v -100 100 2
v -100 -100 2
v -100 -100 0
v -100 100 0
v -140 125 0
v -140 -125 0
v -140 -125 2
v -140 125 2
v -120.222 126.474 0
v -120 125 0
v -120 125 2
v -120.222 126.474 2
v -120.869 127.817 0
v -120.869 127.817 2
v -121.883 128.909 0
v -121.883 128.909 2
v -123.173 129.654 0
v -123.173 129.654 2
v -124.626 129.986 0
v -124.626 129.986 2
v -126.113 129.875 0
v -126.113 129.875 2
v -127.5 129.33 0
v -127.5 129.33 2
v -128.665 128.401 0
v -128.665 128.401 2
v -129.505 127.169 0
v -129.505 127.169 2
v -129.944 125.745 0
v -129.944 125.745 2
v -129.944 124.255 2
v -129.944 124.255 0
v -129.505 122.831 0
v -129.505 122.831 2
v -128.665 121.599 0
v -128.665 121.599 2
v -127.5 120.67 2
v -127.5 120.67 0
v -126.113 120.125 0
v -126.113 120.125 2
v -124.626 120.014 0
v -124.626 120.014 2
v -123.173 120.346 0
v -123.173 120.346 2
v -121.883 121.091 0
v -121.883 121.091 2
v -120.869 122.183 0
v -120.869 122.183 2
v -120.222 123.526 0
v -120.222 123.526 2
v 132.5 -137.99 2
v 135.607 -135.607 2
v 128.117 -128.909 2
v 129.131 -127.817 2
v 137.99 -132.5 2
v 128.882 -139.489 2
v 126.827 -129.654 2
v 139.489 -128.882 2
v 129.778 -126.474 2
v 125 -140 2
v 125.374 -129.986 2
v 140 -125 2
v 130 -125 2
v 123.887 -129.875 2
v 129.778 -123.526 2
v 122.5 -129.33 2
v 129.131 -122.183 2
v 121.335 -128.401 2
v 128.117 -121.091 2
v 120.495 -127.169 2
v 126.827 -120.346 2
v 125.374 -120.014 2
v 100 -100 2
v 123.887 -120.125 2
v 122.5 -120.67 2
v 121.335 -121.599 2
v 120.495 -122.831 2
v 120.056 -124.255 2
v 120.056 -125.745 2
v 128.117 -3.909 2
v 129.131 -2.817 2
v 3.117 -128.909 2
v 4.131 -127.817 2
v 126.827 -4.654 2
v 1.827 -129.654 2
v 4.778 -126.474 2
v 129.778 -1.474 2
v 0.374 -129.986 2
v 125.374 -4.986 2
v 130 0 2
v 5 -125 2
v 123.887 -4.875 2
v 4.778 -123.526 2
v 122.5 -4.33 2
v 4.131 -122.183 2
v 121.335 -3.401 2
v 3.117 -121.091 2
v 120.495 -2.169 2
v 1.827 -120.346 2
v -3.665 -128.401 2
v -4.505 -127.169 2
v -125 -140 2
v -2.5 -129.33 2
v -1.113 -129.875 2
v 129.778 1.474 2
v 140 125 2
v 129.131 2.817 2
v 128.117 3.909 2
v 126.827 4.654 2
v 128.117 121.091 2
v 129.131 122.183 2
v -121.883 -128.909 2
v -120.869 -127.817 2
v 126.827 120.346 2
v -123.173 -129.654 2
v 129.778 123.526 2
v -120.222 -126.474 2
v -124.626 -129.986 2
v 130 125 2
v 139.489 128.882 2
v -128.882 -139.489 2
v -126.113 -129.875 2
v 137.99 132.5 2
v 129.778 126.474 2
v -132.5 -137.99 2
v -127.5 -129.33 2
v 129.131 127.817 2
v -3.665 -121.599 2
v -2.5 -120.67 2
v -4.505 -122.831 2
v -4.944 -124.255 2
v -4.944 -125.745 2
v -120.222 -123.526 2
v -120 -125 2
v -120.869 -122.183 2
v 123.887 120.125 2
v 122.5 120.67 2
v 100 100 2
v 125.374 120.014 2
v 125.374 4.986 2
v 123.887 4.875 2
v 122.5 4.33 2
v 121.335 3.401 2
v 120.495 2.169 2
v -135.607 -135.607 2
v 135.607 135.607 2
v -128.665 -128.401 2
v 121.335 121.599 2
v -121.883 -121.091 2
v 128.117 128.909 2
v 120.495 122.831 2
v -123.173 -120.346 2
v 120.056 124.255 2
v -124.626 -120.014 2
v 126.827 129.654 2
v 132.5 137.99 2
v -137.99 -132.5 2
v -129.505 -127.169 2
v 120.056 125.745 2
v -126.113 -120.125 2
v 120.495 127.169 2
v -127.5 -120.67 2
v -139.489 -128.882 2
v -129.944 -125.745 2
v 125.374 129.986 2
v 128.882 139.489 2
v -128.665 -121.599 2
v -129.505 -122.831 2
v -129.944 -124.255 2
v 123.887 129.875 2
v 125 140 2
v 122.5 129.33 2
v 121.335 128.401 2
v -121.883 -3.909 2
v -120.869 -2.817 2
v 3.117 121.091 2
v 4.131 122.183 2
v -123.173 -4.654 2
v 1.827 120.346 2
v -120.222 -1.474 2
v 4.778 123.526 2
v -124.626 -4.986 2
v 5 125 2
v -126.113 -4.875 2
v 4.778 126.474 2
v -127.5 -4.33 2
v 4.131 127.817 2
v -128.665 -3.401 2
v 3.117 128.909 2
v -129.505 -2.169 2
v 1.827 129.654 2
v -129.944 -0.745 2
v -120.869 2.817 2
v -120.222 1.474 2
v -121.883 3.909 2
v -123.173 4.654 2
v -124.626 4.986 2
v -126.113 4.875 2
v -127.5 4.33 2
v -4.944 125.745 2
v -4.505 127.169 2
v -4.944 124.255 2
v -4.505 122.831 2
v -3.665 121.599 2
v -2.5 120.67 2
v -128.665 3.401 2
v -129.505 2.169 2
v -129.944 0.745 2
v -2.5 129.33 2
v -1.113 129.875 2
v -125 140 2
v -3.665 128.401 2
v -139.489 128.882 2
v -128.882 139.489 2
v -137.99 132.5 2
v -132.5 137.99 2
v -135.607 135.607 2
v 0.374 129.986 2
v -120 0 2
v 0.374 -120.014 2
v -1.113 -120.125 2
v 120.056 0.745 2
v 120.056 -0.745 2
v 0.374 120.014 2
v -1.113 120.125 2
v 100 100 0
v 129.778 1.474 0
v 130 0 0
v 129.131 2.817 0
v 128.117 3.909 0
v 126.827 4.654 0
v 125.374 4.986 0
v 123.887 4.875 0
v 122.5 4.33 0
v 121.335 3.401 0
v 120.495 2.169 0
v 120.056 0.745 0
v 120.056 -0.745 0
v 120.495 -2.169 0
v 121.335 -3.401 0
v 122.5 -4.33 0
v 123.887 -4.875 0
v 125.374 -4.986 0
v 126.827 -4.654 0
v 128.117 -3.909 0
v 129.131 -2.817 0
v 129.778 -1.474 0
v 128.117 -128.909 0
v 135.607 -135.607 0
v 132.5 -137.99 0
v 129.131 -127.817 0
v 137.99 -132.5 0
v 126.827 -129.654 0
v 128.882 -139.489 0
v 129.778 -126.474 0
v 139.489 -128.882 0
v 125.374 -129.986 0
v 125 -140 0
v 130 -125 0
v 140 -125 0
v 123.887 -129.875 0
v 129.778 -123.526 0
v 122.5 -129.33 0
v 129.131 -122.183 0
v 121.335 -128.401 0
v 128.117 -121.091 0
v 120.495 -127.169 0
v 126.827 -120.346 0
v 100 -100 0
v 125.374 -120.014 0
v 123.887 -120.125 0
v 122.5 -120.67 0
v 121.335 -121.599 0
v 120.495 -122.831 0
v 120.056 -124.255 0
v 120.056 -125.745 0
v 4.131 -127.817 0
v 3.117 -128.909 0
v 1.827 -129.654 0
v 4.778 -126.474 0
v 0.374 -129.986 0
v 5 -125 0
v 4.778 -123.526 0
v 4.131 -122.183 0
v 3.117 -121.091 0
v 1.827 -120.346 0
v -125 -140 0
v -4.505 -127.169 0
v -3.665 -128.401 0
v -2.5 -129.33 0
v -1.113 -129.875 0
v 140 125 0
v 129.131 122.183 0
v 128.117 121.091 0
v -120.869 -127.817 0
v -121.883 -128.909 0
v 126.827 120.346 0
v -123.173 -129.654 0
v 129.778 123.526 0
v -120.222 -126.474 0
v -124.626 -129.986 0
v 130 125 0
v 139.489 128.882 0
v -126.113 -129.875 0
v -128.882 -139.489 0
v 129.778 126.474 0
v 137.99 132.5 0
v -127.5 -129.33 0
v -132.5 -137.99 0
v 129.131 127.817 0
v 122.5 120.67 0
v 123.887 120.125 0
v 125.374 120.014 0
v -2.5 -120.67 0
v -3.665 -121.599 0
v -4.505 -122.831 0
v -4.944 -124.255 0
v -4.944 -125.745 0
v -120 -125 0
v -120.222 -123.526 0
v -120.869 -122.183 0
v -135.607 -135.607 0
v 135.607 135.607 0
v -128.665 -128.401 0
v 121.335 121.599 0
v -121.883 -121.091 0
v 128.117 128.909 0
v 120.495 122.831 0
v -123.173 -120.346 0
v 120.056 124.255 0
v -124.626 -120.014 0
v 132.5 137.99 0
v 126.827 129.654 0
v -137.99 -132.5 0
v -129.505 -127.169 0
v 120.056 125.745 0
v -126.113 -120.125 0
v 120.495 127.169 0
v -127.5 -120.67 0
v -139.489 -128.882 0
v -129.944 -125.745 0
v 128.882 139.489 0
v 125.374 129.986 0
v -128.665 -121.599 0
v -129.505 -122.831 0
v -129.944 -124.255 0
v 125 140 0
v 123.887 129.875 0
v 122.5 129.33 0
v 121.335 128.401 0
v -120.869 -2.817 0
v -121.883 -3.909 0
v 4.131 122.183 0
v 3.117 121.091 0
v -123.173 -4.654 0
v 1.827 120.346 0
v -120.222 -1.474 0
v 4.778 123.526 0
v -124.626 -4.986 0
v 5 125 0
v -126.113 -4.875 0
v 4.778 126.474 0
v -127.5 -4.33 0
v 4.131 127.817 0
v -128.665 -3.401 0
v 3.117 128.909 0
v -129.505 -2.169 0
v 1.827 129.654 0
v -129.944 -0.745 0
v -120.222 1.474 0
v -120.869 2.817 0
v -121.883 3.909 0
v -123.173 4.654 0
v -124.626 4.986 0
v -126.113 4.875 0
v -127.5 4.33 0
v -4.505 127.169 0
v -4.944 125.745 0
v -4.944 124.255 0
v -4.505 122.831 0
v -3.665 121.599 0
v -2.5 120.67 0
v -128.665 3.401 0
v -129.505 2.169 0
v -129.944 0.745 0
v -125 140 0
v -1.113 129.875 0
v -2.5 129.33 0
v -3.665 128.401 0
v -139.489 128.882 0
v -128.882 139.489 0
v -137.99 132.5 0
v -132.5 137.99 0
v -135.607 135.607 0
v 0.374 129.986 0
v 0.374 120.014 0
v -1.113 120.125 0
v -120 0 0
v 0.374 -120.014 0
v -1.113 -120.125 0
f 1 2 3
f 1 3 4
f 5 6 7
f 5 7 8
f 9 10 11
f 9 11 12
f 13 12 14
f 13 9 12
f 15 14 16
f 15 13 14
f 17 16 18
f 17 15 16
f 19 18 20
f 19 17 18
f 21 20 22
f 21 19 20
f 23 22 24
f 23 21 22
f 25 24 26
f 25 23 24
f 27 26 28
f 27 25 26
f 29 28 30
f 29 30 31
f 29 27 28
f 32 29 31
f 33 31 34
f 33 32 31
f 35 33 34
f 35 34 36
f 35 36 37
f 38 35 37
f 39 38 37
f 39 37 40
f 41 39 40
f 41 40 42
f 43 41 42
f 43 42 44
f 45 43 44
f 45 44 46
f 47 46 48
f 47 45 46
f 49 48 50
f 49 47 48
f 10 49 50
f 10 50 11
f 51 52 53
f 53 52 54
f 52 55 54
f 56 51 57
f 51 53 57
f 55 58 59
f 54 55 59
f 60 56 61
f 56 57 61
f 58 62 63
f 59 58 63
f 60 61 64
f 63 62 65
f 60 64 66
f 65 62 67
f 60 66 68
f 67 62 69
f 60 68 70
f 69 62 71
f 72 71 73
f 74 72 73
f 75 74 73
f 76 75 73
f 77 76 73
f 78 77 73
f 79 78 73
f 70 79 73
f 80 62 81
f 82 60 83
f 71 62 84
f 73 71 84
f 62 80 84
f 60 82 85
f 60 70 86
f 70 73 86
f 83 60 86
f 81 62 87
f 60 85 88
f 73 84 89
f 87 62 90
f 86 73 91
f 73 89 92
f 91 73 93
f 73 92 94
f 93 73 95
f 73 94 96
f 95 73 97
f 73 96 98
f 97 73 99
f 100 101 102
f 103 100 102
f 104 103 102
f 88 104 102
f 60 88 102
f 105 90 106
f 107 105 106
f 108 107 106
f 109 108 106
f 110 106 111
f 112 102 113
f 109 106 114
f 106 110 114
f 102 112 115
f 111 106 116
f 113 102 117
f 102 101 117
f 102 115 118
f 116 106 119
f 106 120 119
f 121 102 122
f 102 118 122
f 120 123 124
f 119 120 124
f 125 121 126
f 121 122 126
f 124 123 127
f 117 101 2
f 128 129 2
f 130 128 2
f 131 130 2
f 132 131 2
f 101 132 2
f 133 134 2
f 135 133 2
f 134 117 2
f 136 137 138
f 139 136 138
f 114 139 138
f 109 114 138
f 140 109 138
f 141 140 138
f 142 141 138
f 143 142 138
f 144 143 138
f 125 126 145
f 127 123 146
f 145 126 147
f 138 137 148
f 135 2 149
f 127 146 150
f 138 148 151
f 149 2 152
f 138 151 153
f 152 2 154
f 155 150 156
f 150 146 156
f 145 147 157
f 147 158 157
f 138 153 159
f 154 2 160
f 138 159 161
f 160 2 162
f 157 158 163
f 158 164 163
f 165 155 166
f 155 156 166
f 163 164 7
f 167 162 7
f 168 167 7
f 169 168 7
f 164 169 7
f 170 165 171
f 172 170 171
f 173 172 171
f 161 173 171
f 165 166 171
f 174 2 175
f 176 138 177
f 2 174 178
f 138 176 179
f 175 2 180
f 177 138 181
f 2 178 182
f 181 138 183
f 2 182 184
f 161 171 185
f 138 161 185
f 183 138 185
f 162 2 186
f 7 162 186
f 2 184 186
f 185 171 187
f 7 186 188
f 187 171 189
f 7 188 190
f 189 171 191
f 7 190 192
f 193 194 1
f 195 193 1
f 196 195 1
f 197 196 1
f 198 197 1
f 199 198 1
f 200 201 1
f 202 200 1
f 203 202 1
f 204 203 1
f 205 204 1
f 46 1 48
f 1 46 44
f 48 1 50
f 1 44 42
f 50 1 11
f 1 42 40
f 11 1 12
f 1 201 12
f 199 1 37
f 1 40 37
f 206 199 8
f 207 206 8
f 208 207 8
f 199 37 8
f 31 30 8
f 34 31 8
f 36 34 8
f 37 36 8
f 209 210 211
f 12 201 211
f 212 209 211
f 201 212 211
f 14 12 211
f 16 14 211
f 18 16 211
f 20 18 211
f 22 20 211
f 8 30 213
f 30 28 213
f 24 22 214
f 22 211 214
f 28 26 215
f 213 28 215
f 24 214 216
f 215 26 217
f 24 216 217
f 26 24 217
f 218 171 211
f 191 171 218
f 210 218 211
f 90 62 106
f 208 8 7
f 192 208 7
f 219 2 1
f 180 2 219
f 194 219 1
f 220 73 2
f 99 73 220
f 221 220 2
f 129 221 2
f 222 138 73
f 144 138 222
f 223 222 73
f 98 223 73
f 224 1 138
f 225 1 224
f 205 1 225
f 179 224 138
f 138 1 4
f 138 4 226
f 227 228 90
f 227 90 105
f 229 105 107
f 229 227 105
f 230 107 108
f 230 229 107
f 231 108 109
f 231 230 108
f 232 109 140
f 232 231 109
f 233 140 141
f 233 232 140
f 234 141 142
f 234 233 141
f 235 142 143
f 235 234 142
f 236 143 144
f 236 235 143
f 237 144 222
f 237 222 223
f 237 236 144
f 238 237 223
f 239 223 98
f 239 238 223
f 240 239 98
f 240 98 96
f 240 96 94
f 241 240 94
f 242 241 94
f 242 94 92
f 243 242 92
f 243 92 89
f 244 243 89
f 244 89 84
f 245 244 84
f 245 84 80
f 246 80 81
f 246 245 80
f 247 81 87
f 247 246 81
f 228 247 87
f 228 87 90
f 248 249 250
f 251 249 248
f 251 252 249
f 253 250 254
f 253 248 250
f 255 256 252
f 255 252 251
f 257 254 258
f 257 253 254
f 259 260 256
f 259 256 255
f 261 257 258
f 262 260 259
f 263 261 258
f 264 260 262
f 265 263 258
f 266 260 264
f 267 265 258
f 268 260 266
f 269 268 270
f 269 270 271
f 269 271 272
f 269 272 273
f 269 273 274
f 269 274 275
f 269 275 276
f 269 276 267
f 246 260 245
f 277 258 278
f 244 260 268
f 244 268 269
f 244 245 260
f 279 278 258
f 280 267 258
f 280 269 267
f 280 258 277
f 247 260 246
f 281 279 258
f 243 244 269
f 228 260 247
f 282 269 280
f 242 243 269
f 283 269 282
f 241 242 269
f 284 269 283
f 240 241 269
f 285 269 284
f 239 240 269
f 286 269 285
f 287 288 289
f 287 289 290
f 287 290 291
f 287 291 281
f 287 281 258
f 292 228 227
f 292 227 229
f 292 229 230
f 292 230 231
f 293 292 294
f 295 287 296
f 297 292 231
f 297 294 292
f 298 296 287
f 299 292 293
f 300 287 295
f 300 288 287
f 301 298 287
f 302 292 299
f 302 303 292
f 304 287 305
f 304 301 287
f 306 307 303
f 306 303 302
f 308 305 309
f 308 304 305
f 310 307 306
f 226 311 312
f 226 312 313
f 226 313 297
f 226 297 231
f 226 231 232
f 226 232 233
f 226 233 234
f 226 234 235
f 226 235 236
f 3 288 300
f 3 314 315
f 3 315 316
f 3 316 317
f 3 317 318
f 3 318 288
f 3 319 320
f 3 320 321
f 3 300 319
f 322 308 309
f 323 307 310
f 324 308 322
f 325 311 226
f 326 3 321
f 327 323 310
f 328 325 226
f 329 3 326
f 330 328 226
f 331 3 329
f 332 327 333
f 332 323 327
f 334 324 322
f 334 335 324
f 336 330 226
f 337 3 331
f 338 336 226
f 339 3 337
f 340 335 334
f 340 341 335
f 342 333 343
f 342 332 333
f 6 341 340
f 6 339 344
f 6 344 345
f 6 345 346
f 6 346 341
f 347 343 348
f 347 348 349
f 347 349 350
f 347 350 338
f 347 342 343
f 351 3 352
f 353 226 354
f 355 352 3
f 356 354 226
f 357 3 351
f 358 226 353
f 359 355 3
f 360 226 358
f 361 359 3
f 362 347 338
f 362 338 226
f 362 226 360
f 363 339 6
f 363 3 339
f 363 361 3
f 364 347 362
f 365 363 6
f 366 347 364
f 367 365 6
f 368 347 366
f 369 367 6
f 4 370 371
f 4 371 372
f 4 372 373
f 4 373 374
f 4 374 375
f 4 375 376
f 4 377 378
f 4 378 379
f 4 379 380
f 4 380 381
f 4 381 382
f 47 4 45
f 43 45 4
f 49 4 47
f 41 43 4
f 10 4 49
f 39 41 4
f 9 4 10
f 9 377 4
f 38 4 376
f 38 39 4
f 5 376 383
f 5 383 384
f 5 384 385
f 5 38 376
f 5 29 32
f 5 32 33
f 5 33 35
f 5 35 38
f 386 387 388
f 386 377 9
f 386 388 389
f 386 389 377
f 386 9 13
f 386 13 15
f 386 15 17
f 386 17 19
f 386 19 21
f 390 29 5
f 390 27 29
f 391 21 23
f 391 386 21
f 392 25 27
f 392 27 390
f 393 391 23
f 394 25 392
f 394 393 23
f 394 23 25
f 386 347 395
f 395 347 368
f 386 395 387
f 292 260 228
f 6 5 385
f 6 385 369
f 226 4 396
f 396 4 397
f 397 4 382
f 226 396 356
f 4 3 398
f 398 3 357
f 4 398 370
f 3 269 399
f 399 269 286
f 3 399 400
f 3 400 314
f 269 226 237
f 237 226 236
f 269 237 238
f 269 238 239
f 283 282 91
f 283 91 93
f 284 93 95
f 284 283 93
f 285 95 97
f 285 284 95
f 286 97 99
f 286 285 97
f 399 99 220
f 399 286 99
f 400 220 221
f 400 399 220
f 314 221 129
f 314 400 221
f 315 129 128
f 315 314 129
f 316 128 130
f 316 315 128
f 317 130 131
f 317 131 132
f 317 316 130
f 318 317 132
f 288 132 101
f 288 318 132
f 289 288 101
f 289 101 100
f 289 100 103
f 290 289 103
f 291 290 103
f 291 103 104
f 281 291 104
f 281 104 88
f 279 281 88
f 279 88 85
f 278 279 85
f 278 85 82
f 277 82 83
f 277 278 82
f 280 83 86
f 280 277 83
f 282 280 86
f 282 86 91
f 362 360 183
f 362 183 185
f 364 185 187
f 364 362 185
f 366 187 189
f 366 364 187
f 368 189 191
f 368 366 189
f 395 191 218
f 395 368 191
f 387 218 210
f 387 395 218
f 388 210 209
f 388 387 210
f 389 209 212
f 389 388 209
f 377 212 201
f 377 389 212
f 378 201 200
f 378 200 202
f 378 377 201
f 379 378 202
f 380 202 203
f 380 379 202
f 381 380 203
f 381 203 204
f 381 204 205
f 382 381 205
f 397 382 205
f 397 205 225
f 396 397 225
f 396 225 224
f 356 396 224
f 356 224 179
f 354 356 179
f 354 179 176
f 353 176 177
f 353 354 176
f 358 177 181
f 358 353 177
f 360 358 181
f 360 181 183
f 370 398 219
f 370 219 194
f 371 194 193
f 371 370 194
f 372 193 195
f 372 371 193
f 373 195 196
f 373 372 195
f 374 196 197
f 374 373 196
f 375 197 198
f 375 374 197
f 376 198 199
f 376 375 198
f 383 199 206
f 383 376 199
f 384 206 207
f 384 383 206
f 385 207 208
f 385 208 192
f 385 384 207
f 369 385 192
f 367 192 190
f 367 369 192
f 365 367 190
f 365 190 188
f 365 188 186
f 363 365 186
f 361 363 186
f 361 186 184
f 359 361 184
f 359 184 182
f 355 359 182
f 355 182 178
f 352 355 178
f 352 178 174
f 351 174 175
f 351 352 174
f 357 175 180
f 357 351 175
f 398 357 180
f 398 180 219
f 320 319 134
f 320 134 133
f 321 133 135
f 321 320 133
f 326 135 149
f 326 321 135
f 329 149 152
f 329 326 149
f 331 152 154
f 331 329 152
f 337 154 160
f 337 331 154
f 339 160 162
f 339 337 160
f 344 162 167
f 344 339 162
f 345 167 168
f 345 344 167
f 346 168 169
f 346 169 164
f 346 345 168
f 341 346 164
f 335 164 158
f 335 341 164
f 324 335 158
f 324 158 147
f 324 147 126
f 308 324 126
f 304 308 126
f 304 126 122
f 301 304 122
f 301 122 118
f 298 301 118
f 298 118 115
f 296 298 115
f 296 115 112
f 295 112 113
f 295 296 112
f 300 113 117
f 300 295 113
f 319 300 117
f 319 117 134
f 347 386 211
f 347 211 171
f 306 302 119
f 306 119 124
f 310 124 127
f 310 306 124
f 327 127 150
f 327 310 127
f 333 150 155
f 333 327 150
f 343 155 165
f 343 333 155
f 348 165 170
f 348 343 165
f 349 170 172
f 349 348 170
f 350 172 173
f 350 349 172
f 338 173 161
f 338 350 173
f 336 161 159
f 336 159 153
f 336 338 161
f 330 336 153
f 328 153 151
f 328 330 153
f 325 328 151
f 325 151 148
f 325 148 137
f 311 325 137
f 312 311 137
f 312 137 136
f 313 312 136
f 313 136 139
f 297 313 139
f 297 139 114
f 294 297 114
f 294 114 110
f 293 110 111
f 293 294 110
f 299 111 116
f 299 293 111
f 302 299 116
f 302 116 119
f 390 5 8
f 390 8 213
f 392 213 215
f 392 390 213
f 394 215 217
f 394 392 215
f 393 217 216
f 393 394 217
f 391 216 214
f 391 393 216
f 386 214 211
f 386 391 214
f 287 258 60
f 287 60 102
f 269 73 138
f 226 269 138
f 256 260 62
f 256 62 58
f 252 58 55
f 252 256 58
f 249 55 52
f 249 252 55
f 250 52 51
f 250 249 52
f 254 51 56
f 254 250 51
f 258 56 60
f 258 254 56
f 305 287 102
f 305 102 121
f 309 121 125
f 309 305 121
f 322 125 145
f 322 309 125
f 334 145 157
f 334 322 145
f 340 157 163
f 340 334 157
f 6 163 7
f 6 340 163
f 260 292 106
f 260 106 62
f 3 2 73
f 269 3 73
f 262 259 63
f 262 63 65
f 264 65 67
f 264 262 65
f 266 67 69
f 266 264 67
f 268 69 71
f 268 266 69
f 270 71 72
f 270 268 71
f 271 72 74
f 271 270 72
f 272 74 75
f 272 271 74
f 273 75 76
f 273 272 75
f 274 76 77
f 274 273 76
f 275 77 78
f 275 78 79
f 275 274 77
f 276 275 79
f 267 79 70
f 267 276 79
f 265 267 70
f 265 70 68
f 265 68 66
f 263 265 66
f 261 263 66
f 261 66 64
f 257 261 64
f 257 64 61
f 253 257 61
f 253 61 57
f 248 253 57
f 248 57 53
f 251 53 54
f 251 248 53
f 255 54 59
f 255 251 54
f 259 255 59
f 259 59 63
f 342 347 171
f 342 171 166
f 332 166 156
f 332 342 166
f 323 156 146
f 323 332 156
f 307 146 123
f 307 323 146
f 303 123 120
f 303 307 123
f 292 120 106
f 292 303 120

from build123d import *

# Parameters (mm, degrees)
SKETCH2_R           = 5
SKETCH2_R_2         = 4
BOSS_EXTRUDE1_DEPTH = 2
SKETCH3_W           = 200
SKETCH3_H           = 200
CUT_EXTRUDE1_DEPTH  = 10


with BuildPart() as part:
    # Sketch2 → Boss-Extrude1 (new body)
    with BuildSketch(Plane.XY):
        with BuildLine():
            Line((-125, 140), (125, 140))
            ThreePointArc((125, 140), (135.606601718, 135.606601718), (140, 125))
            Line((140, 125), (140, -125))
            ThreePointArc((140, -125), (135.606601718, -135.606601718), (125, -140))
            Line((125, -140), (-125, -140))
            ThreePointArc((-125, -140), (-135.606601718, -135.606601718), (-140, -125))
            Line((-140, -125), (-140, 125))
            ThreePointArc((-140, 125), (-135.606601718, 135.606601718), (-125, 140))
        make_face()
        with Locations((-125, 125)):
            Circle(SKETCH2_R, mode=Mode.SUBTRACT)
        with Locations((0, 125)):
            Circle(SKETCH2_R, mode=Mode.SUBTRACT)
        with Locations((125, 125)):
            Circle(SKETCH2_R, mode=Mode.SUBTRACT)
        Circle(SKETCH2_R_2, mode=Mode.SUBTRACT)
        with Locations((125, 0)):
            Circle(SKETCH2_R, mode=Mode.SUBTRACT)
        with Locations((-125, 0)):
            Circle(SKETCH2_R, mode=Mode.SUBTRACT)
        with Locations((-125, -125)):
            Circle(SKETCH2_R, mode=Mode.SUBTRACT)
        with Locations((0, -125)):
            Circle(SKETCH2_R, mode=Mode.SUBTRACT)
        with Locations((125, -125)):
            Circle(SKETCH2_R, mode=Mode.SUBTRACT)
    extrude(amount=BOSS_EXTRUDE1_DEPTH)

    # Sketch3 → Cut-Extrude1 (cut)
    with BuildSketch(Plane.XY.offset(2)):
        Rectangle(SKETCH3_W, SKETCH3_H)
    extrude(amount=-CUT_EXTRUDE1_DEPTH, mode=Mode.SUBTRACT)


solid = part.part
